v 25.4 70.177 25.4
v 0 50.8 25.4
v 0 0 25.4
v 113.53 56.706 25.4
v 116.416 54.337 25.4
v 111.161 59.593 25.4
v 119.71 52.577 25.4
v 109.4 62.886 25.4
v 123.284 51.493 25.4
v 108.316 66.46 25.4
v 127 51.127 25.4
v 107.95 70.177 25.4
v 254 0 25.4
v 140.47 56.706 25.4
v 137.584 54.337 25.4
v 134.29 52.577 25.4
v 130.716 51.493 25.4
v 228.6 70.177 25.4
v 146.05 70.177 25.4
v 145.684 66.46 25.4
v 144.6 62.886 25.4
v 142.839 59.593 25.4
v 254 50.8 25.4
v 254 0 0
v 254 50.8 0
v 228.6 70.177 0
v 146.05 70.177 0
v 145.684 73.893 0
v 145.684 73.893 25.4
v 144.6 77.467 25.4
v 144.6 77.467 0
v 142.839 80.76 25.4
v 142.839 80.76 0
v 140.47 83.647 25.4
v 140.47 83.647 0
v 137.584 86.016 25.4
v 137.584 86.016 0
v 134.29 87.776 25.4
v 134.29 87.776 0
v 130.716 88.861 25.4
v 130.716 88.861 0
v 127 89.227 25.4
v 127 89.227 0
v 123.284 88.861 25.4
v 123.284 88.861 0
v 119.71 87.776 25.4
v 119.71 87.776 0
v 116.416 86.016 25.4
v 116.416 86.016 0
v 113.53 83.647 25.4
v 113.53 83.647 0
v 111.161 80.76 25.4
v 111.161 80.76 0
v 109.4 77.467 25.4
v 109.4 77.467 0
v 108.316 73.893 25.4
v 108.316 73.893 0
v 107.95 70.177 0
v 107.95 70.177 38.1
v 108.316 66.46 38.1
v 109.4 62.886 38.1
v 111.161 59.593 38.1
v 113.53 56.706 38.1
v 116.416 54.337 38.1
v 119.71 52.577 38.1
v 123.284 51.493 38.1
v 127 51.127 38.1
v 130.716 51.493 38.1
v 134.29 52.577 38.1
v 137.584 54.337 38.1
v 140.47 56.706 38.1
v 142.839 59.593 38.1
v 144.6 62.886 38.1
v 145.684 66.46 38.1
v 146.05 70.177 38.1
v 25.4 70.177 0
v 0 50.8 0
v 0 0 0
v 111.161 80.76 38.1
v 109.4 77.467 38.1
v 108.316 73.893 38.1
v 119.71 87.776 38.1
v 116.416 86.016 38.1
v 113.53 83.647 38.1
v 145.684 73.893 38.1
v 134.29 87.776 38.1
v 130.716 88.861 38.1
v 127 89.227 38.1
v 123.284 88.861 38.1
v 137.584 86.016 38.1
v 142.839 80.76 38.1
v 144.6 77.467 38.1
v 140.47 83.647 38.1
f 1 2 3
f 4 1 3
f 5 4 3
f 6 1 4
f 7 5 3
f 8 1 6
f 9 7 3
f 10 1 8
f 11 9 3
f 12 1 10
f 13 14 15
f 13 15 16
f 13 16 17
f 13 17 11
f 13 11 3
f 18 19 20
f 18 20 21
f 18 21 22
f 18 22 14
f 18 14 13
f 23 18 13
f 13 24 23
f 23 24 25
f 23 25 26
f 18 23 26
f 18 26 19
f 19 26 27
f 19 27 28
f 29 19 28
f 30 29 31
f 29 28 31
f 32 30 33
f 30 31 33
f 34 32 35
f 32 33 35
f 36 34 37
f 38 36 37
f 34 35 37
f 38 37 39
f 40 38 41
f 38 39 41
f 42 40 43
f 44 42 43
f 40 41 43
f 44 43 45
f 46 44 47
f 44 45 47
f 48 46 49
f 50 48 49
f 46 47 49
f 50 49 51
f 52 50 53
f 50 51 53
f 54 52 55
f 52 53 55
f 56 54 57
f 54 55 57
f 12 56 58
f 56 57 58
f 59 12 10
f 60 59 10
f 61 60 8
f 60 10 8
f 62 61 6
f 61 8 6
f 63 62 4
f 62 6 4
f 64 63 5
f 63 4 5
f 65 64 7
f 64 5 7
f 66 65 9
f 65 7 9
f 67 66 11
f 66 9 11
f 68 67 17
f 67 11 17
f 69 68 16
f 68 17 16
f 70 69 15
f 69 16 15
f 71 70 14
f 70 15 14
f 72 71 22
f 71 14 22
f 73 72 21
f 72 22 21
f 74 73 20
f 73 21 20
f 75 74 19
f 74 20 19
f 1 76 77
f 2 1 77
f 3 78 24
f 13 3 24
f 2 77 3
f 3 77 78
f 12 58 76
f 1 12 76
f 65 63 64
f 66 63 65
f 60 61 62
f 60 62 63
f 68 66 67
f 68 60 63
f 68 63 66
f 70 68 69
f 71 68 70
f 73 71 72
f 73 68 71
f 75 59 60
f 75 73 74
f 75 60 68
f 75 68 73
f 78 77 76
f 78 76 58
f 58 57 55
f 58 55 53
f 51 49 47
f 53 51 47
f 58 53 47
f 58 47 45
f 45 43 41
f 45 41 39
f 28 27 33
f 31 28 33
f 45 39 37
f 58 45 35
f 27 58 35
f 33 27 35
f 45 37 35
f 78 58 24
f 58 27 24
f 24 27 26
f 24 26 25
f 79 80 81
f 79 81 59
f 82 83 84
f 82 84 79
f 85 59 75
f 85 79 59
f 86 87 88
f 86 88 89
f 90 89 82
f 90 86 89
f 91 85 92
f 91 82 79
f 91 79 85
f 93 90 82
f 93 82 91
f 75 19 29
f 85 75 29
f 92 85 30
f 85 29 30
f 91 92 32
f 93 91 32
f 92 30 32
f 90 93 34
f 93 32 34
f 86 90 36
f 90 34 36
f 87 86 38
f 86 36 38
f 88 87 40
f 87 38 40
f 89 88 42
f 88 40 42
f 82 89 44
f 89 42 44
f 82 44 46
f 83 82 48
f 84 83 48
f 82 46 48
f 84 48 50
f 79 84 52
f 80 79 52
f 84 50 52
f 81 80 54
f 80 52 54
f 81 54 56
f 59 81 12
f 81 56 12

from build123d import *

# Parameters (mm, degrees)
F1_DEPTH = 25.4
F3_DEPTH = 38.1


with BuildPart() as f1:
    # F0 (on Top) → F1 (new body)
    with BuildSketch(Plane.XY):
        with BuildLine():
            ThreePointArc((146.05, 70.1765862209), (127, 89.2265862209), (107.95, 70.1765862209))
            Line((107.95, 70.1765862209), (146.05, 70.1765862209))
        make_face()
        with BuildLine():
            Line((146.05, 70.1765862209), (107.95, 70.1765862209))
            ThreePointArc((107.95, 70.1765862209), (127, 51.1265862209), (146.05, 70.1765862209))
        make_face()
        with BuildLine():
            Line((25.4, 70.1765862209), (0, 50.8))
            Line((0, 50.8), (0, 0))
            Line((0, 0), (254, 0))
            Line((254, 0), (254, 50.8))
            Line((254, 50.8), (228.6, 70.1765862209))
            Line((228.6, 70.1765862209), (146.05, 70.1765862209))
            ThreePointArc((146.05, 70.1765862209), (127, 51.1265862209), (107.95, 70.1765862209))
            Line((107.95, 70.1765862209), (25.4, 70.1765862209))
        make_face()
    extrude(amount=F1_DEPTH)

    # F2 (on face) + F0 (on Top) → F3 (join)
    with BuildSketch(Plane.XY):
        with BuildLine():
            ThreePointArc((107.95, 70.1765862209), (127, 51.1265862209), (146.05, 70.1765862209))
            Line((146.05, 70.1765862209), (107.95, 70.1765862209))
        make_face()
    with BuildSketch(Plane.XY):
        with BuildLine():
            ThreePointArc((146.05, 70.1765862209), (127, 89.2265862209), (107.95, 70.1765862209))
            Line((107.95, 70.1765862209), (146.05, 70.1765862209))
        make_face()
    extrude(amount=F3_DEPTH)


solid = f1.part
